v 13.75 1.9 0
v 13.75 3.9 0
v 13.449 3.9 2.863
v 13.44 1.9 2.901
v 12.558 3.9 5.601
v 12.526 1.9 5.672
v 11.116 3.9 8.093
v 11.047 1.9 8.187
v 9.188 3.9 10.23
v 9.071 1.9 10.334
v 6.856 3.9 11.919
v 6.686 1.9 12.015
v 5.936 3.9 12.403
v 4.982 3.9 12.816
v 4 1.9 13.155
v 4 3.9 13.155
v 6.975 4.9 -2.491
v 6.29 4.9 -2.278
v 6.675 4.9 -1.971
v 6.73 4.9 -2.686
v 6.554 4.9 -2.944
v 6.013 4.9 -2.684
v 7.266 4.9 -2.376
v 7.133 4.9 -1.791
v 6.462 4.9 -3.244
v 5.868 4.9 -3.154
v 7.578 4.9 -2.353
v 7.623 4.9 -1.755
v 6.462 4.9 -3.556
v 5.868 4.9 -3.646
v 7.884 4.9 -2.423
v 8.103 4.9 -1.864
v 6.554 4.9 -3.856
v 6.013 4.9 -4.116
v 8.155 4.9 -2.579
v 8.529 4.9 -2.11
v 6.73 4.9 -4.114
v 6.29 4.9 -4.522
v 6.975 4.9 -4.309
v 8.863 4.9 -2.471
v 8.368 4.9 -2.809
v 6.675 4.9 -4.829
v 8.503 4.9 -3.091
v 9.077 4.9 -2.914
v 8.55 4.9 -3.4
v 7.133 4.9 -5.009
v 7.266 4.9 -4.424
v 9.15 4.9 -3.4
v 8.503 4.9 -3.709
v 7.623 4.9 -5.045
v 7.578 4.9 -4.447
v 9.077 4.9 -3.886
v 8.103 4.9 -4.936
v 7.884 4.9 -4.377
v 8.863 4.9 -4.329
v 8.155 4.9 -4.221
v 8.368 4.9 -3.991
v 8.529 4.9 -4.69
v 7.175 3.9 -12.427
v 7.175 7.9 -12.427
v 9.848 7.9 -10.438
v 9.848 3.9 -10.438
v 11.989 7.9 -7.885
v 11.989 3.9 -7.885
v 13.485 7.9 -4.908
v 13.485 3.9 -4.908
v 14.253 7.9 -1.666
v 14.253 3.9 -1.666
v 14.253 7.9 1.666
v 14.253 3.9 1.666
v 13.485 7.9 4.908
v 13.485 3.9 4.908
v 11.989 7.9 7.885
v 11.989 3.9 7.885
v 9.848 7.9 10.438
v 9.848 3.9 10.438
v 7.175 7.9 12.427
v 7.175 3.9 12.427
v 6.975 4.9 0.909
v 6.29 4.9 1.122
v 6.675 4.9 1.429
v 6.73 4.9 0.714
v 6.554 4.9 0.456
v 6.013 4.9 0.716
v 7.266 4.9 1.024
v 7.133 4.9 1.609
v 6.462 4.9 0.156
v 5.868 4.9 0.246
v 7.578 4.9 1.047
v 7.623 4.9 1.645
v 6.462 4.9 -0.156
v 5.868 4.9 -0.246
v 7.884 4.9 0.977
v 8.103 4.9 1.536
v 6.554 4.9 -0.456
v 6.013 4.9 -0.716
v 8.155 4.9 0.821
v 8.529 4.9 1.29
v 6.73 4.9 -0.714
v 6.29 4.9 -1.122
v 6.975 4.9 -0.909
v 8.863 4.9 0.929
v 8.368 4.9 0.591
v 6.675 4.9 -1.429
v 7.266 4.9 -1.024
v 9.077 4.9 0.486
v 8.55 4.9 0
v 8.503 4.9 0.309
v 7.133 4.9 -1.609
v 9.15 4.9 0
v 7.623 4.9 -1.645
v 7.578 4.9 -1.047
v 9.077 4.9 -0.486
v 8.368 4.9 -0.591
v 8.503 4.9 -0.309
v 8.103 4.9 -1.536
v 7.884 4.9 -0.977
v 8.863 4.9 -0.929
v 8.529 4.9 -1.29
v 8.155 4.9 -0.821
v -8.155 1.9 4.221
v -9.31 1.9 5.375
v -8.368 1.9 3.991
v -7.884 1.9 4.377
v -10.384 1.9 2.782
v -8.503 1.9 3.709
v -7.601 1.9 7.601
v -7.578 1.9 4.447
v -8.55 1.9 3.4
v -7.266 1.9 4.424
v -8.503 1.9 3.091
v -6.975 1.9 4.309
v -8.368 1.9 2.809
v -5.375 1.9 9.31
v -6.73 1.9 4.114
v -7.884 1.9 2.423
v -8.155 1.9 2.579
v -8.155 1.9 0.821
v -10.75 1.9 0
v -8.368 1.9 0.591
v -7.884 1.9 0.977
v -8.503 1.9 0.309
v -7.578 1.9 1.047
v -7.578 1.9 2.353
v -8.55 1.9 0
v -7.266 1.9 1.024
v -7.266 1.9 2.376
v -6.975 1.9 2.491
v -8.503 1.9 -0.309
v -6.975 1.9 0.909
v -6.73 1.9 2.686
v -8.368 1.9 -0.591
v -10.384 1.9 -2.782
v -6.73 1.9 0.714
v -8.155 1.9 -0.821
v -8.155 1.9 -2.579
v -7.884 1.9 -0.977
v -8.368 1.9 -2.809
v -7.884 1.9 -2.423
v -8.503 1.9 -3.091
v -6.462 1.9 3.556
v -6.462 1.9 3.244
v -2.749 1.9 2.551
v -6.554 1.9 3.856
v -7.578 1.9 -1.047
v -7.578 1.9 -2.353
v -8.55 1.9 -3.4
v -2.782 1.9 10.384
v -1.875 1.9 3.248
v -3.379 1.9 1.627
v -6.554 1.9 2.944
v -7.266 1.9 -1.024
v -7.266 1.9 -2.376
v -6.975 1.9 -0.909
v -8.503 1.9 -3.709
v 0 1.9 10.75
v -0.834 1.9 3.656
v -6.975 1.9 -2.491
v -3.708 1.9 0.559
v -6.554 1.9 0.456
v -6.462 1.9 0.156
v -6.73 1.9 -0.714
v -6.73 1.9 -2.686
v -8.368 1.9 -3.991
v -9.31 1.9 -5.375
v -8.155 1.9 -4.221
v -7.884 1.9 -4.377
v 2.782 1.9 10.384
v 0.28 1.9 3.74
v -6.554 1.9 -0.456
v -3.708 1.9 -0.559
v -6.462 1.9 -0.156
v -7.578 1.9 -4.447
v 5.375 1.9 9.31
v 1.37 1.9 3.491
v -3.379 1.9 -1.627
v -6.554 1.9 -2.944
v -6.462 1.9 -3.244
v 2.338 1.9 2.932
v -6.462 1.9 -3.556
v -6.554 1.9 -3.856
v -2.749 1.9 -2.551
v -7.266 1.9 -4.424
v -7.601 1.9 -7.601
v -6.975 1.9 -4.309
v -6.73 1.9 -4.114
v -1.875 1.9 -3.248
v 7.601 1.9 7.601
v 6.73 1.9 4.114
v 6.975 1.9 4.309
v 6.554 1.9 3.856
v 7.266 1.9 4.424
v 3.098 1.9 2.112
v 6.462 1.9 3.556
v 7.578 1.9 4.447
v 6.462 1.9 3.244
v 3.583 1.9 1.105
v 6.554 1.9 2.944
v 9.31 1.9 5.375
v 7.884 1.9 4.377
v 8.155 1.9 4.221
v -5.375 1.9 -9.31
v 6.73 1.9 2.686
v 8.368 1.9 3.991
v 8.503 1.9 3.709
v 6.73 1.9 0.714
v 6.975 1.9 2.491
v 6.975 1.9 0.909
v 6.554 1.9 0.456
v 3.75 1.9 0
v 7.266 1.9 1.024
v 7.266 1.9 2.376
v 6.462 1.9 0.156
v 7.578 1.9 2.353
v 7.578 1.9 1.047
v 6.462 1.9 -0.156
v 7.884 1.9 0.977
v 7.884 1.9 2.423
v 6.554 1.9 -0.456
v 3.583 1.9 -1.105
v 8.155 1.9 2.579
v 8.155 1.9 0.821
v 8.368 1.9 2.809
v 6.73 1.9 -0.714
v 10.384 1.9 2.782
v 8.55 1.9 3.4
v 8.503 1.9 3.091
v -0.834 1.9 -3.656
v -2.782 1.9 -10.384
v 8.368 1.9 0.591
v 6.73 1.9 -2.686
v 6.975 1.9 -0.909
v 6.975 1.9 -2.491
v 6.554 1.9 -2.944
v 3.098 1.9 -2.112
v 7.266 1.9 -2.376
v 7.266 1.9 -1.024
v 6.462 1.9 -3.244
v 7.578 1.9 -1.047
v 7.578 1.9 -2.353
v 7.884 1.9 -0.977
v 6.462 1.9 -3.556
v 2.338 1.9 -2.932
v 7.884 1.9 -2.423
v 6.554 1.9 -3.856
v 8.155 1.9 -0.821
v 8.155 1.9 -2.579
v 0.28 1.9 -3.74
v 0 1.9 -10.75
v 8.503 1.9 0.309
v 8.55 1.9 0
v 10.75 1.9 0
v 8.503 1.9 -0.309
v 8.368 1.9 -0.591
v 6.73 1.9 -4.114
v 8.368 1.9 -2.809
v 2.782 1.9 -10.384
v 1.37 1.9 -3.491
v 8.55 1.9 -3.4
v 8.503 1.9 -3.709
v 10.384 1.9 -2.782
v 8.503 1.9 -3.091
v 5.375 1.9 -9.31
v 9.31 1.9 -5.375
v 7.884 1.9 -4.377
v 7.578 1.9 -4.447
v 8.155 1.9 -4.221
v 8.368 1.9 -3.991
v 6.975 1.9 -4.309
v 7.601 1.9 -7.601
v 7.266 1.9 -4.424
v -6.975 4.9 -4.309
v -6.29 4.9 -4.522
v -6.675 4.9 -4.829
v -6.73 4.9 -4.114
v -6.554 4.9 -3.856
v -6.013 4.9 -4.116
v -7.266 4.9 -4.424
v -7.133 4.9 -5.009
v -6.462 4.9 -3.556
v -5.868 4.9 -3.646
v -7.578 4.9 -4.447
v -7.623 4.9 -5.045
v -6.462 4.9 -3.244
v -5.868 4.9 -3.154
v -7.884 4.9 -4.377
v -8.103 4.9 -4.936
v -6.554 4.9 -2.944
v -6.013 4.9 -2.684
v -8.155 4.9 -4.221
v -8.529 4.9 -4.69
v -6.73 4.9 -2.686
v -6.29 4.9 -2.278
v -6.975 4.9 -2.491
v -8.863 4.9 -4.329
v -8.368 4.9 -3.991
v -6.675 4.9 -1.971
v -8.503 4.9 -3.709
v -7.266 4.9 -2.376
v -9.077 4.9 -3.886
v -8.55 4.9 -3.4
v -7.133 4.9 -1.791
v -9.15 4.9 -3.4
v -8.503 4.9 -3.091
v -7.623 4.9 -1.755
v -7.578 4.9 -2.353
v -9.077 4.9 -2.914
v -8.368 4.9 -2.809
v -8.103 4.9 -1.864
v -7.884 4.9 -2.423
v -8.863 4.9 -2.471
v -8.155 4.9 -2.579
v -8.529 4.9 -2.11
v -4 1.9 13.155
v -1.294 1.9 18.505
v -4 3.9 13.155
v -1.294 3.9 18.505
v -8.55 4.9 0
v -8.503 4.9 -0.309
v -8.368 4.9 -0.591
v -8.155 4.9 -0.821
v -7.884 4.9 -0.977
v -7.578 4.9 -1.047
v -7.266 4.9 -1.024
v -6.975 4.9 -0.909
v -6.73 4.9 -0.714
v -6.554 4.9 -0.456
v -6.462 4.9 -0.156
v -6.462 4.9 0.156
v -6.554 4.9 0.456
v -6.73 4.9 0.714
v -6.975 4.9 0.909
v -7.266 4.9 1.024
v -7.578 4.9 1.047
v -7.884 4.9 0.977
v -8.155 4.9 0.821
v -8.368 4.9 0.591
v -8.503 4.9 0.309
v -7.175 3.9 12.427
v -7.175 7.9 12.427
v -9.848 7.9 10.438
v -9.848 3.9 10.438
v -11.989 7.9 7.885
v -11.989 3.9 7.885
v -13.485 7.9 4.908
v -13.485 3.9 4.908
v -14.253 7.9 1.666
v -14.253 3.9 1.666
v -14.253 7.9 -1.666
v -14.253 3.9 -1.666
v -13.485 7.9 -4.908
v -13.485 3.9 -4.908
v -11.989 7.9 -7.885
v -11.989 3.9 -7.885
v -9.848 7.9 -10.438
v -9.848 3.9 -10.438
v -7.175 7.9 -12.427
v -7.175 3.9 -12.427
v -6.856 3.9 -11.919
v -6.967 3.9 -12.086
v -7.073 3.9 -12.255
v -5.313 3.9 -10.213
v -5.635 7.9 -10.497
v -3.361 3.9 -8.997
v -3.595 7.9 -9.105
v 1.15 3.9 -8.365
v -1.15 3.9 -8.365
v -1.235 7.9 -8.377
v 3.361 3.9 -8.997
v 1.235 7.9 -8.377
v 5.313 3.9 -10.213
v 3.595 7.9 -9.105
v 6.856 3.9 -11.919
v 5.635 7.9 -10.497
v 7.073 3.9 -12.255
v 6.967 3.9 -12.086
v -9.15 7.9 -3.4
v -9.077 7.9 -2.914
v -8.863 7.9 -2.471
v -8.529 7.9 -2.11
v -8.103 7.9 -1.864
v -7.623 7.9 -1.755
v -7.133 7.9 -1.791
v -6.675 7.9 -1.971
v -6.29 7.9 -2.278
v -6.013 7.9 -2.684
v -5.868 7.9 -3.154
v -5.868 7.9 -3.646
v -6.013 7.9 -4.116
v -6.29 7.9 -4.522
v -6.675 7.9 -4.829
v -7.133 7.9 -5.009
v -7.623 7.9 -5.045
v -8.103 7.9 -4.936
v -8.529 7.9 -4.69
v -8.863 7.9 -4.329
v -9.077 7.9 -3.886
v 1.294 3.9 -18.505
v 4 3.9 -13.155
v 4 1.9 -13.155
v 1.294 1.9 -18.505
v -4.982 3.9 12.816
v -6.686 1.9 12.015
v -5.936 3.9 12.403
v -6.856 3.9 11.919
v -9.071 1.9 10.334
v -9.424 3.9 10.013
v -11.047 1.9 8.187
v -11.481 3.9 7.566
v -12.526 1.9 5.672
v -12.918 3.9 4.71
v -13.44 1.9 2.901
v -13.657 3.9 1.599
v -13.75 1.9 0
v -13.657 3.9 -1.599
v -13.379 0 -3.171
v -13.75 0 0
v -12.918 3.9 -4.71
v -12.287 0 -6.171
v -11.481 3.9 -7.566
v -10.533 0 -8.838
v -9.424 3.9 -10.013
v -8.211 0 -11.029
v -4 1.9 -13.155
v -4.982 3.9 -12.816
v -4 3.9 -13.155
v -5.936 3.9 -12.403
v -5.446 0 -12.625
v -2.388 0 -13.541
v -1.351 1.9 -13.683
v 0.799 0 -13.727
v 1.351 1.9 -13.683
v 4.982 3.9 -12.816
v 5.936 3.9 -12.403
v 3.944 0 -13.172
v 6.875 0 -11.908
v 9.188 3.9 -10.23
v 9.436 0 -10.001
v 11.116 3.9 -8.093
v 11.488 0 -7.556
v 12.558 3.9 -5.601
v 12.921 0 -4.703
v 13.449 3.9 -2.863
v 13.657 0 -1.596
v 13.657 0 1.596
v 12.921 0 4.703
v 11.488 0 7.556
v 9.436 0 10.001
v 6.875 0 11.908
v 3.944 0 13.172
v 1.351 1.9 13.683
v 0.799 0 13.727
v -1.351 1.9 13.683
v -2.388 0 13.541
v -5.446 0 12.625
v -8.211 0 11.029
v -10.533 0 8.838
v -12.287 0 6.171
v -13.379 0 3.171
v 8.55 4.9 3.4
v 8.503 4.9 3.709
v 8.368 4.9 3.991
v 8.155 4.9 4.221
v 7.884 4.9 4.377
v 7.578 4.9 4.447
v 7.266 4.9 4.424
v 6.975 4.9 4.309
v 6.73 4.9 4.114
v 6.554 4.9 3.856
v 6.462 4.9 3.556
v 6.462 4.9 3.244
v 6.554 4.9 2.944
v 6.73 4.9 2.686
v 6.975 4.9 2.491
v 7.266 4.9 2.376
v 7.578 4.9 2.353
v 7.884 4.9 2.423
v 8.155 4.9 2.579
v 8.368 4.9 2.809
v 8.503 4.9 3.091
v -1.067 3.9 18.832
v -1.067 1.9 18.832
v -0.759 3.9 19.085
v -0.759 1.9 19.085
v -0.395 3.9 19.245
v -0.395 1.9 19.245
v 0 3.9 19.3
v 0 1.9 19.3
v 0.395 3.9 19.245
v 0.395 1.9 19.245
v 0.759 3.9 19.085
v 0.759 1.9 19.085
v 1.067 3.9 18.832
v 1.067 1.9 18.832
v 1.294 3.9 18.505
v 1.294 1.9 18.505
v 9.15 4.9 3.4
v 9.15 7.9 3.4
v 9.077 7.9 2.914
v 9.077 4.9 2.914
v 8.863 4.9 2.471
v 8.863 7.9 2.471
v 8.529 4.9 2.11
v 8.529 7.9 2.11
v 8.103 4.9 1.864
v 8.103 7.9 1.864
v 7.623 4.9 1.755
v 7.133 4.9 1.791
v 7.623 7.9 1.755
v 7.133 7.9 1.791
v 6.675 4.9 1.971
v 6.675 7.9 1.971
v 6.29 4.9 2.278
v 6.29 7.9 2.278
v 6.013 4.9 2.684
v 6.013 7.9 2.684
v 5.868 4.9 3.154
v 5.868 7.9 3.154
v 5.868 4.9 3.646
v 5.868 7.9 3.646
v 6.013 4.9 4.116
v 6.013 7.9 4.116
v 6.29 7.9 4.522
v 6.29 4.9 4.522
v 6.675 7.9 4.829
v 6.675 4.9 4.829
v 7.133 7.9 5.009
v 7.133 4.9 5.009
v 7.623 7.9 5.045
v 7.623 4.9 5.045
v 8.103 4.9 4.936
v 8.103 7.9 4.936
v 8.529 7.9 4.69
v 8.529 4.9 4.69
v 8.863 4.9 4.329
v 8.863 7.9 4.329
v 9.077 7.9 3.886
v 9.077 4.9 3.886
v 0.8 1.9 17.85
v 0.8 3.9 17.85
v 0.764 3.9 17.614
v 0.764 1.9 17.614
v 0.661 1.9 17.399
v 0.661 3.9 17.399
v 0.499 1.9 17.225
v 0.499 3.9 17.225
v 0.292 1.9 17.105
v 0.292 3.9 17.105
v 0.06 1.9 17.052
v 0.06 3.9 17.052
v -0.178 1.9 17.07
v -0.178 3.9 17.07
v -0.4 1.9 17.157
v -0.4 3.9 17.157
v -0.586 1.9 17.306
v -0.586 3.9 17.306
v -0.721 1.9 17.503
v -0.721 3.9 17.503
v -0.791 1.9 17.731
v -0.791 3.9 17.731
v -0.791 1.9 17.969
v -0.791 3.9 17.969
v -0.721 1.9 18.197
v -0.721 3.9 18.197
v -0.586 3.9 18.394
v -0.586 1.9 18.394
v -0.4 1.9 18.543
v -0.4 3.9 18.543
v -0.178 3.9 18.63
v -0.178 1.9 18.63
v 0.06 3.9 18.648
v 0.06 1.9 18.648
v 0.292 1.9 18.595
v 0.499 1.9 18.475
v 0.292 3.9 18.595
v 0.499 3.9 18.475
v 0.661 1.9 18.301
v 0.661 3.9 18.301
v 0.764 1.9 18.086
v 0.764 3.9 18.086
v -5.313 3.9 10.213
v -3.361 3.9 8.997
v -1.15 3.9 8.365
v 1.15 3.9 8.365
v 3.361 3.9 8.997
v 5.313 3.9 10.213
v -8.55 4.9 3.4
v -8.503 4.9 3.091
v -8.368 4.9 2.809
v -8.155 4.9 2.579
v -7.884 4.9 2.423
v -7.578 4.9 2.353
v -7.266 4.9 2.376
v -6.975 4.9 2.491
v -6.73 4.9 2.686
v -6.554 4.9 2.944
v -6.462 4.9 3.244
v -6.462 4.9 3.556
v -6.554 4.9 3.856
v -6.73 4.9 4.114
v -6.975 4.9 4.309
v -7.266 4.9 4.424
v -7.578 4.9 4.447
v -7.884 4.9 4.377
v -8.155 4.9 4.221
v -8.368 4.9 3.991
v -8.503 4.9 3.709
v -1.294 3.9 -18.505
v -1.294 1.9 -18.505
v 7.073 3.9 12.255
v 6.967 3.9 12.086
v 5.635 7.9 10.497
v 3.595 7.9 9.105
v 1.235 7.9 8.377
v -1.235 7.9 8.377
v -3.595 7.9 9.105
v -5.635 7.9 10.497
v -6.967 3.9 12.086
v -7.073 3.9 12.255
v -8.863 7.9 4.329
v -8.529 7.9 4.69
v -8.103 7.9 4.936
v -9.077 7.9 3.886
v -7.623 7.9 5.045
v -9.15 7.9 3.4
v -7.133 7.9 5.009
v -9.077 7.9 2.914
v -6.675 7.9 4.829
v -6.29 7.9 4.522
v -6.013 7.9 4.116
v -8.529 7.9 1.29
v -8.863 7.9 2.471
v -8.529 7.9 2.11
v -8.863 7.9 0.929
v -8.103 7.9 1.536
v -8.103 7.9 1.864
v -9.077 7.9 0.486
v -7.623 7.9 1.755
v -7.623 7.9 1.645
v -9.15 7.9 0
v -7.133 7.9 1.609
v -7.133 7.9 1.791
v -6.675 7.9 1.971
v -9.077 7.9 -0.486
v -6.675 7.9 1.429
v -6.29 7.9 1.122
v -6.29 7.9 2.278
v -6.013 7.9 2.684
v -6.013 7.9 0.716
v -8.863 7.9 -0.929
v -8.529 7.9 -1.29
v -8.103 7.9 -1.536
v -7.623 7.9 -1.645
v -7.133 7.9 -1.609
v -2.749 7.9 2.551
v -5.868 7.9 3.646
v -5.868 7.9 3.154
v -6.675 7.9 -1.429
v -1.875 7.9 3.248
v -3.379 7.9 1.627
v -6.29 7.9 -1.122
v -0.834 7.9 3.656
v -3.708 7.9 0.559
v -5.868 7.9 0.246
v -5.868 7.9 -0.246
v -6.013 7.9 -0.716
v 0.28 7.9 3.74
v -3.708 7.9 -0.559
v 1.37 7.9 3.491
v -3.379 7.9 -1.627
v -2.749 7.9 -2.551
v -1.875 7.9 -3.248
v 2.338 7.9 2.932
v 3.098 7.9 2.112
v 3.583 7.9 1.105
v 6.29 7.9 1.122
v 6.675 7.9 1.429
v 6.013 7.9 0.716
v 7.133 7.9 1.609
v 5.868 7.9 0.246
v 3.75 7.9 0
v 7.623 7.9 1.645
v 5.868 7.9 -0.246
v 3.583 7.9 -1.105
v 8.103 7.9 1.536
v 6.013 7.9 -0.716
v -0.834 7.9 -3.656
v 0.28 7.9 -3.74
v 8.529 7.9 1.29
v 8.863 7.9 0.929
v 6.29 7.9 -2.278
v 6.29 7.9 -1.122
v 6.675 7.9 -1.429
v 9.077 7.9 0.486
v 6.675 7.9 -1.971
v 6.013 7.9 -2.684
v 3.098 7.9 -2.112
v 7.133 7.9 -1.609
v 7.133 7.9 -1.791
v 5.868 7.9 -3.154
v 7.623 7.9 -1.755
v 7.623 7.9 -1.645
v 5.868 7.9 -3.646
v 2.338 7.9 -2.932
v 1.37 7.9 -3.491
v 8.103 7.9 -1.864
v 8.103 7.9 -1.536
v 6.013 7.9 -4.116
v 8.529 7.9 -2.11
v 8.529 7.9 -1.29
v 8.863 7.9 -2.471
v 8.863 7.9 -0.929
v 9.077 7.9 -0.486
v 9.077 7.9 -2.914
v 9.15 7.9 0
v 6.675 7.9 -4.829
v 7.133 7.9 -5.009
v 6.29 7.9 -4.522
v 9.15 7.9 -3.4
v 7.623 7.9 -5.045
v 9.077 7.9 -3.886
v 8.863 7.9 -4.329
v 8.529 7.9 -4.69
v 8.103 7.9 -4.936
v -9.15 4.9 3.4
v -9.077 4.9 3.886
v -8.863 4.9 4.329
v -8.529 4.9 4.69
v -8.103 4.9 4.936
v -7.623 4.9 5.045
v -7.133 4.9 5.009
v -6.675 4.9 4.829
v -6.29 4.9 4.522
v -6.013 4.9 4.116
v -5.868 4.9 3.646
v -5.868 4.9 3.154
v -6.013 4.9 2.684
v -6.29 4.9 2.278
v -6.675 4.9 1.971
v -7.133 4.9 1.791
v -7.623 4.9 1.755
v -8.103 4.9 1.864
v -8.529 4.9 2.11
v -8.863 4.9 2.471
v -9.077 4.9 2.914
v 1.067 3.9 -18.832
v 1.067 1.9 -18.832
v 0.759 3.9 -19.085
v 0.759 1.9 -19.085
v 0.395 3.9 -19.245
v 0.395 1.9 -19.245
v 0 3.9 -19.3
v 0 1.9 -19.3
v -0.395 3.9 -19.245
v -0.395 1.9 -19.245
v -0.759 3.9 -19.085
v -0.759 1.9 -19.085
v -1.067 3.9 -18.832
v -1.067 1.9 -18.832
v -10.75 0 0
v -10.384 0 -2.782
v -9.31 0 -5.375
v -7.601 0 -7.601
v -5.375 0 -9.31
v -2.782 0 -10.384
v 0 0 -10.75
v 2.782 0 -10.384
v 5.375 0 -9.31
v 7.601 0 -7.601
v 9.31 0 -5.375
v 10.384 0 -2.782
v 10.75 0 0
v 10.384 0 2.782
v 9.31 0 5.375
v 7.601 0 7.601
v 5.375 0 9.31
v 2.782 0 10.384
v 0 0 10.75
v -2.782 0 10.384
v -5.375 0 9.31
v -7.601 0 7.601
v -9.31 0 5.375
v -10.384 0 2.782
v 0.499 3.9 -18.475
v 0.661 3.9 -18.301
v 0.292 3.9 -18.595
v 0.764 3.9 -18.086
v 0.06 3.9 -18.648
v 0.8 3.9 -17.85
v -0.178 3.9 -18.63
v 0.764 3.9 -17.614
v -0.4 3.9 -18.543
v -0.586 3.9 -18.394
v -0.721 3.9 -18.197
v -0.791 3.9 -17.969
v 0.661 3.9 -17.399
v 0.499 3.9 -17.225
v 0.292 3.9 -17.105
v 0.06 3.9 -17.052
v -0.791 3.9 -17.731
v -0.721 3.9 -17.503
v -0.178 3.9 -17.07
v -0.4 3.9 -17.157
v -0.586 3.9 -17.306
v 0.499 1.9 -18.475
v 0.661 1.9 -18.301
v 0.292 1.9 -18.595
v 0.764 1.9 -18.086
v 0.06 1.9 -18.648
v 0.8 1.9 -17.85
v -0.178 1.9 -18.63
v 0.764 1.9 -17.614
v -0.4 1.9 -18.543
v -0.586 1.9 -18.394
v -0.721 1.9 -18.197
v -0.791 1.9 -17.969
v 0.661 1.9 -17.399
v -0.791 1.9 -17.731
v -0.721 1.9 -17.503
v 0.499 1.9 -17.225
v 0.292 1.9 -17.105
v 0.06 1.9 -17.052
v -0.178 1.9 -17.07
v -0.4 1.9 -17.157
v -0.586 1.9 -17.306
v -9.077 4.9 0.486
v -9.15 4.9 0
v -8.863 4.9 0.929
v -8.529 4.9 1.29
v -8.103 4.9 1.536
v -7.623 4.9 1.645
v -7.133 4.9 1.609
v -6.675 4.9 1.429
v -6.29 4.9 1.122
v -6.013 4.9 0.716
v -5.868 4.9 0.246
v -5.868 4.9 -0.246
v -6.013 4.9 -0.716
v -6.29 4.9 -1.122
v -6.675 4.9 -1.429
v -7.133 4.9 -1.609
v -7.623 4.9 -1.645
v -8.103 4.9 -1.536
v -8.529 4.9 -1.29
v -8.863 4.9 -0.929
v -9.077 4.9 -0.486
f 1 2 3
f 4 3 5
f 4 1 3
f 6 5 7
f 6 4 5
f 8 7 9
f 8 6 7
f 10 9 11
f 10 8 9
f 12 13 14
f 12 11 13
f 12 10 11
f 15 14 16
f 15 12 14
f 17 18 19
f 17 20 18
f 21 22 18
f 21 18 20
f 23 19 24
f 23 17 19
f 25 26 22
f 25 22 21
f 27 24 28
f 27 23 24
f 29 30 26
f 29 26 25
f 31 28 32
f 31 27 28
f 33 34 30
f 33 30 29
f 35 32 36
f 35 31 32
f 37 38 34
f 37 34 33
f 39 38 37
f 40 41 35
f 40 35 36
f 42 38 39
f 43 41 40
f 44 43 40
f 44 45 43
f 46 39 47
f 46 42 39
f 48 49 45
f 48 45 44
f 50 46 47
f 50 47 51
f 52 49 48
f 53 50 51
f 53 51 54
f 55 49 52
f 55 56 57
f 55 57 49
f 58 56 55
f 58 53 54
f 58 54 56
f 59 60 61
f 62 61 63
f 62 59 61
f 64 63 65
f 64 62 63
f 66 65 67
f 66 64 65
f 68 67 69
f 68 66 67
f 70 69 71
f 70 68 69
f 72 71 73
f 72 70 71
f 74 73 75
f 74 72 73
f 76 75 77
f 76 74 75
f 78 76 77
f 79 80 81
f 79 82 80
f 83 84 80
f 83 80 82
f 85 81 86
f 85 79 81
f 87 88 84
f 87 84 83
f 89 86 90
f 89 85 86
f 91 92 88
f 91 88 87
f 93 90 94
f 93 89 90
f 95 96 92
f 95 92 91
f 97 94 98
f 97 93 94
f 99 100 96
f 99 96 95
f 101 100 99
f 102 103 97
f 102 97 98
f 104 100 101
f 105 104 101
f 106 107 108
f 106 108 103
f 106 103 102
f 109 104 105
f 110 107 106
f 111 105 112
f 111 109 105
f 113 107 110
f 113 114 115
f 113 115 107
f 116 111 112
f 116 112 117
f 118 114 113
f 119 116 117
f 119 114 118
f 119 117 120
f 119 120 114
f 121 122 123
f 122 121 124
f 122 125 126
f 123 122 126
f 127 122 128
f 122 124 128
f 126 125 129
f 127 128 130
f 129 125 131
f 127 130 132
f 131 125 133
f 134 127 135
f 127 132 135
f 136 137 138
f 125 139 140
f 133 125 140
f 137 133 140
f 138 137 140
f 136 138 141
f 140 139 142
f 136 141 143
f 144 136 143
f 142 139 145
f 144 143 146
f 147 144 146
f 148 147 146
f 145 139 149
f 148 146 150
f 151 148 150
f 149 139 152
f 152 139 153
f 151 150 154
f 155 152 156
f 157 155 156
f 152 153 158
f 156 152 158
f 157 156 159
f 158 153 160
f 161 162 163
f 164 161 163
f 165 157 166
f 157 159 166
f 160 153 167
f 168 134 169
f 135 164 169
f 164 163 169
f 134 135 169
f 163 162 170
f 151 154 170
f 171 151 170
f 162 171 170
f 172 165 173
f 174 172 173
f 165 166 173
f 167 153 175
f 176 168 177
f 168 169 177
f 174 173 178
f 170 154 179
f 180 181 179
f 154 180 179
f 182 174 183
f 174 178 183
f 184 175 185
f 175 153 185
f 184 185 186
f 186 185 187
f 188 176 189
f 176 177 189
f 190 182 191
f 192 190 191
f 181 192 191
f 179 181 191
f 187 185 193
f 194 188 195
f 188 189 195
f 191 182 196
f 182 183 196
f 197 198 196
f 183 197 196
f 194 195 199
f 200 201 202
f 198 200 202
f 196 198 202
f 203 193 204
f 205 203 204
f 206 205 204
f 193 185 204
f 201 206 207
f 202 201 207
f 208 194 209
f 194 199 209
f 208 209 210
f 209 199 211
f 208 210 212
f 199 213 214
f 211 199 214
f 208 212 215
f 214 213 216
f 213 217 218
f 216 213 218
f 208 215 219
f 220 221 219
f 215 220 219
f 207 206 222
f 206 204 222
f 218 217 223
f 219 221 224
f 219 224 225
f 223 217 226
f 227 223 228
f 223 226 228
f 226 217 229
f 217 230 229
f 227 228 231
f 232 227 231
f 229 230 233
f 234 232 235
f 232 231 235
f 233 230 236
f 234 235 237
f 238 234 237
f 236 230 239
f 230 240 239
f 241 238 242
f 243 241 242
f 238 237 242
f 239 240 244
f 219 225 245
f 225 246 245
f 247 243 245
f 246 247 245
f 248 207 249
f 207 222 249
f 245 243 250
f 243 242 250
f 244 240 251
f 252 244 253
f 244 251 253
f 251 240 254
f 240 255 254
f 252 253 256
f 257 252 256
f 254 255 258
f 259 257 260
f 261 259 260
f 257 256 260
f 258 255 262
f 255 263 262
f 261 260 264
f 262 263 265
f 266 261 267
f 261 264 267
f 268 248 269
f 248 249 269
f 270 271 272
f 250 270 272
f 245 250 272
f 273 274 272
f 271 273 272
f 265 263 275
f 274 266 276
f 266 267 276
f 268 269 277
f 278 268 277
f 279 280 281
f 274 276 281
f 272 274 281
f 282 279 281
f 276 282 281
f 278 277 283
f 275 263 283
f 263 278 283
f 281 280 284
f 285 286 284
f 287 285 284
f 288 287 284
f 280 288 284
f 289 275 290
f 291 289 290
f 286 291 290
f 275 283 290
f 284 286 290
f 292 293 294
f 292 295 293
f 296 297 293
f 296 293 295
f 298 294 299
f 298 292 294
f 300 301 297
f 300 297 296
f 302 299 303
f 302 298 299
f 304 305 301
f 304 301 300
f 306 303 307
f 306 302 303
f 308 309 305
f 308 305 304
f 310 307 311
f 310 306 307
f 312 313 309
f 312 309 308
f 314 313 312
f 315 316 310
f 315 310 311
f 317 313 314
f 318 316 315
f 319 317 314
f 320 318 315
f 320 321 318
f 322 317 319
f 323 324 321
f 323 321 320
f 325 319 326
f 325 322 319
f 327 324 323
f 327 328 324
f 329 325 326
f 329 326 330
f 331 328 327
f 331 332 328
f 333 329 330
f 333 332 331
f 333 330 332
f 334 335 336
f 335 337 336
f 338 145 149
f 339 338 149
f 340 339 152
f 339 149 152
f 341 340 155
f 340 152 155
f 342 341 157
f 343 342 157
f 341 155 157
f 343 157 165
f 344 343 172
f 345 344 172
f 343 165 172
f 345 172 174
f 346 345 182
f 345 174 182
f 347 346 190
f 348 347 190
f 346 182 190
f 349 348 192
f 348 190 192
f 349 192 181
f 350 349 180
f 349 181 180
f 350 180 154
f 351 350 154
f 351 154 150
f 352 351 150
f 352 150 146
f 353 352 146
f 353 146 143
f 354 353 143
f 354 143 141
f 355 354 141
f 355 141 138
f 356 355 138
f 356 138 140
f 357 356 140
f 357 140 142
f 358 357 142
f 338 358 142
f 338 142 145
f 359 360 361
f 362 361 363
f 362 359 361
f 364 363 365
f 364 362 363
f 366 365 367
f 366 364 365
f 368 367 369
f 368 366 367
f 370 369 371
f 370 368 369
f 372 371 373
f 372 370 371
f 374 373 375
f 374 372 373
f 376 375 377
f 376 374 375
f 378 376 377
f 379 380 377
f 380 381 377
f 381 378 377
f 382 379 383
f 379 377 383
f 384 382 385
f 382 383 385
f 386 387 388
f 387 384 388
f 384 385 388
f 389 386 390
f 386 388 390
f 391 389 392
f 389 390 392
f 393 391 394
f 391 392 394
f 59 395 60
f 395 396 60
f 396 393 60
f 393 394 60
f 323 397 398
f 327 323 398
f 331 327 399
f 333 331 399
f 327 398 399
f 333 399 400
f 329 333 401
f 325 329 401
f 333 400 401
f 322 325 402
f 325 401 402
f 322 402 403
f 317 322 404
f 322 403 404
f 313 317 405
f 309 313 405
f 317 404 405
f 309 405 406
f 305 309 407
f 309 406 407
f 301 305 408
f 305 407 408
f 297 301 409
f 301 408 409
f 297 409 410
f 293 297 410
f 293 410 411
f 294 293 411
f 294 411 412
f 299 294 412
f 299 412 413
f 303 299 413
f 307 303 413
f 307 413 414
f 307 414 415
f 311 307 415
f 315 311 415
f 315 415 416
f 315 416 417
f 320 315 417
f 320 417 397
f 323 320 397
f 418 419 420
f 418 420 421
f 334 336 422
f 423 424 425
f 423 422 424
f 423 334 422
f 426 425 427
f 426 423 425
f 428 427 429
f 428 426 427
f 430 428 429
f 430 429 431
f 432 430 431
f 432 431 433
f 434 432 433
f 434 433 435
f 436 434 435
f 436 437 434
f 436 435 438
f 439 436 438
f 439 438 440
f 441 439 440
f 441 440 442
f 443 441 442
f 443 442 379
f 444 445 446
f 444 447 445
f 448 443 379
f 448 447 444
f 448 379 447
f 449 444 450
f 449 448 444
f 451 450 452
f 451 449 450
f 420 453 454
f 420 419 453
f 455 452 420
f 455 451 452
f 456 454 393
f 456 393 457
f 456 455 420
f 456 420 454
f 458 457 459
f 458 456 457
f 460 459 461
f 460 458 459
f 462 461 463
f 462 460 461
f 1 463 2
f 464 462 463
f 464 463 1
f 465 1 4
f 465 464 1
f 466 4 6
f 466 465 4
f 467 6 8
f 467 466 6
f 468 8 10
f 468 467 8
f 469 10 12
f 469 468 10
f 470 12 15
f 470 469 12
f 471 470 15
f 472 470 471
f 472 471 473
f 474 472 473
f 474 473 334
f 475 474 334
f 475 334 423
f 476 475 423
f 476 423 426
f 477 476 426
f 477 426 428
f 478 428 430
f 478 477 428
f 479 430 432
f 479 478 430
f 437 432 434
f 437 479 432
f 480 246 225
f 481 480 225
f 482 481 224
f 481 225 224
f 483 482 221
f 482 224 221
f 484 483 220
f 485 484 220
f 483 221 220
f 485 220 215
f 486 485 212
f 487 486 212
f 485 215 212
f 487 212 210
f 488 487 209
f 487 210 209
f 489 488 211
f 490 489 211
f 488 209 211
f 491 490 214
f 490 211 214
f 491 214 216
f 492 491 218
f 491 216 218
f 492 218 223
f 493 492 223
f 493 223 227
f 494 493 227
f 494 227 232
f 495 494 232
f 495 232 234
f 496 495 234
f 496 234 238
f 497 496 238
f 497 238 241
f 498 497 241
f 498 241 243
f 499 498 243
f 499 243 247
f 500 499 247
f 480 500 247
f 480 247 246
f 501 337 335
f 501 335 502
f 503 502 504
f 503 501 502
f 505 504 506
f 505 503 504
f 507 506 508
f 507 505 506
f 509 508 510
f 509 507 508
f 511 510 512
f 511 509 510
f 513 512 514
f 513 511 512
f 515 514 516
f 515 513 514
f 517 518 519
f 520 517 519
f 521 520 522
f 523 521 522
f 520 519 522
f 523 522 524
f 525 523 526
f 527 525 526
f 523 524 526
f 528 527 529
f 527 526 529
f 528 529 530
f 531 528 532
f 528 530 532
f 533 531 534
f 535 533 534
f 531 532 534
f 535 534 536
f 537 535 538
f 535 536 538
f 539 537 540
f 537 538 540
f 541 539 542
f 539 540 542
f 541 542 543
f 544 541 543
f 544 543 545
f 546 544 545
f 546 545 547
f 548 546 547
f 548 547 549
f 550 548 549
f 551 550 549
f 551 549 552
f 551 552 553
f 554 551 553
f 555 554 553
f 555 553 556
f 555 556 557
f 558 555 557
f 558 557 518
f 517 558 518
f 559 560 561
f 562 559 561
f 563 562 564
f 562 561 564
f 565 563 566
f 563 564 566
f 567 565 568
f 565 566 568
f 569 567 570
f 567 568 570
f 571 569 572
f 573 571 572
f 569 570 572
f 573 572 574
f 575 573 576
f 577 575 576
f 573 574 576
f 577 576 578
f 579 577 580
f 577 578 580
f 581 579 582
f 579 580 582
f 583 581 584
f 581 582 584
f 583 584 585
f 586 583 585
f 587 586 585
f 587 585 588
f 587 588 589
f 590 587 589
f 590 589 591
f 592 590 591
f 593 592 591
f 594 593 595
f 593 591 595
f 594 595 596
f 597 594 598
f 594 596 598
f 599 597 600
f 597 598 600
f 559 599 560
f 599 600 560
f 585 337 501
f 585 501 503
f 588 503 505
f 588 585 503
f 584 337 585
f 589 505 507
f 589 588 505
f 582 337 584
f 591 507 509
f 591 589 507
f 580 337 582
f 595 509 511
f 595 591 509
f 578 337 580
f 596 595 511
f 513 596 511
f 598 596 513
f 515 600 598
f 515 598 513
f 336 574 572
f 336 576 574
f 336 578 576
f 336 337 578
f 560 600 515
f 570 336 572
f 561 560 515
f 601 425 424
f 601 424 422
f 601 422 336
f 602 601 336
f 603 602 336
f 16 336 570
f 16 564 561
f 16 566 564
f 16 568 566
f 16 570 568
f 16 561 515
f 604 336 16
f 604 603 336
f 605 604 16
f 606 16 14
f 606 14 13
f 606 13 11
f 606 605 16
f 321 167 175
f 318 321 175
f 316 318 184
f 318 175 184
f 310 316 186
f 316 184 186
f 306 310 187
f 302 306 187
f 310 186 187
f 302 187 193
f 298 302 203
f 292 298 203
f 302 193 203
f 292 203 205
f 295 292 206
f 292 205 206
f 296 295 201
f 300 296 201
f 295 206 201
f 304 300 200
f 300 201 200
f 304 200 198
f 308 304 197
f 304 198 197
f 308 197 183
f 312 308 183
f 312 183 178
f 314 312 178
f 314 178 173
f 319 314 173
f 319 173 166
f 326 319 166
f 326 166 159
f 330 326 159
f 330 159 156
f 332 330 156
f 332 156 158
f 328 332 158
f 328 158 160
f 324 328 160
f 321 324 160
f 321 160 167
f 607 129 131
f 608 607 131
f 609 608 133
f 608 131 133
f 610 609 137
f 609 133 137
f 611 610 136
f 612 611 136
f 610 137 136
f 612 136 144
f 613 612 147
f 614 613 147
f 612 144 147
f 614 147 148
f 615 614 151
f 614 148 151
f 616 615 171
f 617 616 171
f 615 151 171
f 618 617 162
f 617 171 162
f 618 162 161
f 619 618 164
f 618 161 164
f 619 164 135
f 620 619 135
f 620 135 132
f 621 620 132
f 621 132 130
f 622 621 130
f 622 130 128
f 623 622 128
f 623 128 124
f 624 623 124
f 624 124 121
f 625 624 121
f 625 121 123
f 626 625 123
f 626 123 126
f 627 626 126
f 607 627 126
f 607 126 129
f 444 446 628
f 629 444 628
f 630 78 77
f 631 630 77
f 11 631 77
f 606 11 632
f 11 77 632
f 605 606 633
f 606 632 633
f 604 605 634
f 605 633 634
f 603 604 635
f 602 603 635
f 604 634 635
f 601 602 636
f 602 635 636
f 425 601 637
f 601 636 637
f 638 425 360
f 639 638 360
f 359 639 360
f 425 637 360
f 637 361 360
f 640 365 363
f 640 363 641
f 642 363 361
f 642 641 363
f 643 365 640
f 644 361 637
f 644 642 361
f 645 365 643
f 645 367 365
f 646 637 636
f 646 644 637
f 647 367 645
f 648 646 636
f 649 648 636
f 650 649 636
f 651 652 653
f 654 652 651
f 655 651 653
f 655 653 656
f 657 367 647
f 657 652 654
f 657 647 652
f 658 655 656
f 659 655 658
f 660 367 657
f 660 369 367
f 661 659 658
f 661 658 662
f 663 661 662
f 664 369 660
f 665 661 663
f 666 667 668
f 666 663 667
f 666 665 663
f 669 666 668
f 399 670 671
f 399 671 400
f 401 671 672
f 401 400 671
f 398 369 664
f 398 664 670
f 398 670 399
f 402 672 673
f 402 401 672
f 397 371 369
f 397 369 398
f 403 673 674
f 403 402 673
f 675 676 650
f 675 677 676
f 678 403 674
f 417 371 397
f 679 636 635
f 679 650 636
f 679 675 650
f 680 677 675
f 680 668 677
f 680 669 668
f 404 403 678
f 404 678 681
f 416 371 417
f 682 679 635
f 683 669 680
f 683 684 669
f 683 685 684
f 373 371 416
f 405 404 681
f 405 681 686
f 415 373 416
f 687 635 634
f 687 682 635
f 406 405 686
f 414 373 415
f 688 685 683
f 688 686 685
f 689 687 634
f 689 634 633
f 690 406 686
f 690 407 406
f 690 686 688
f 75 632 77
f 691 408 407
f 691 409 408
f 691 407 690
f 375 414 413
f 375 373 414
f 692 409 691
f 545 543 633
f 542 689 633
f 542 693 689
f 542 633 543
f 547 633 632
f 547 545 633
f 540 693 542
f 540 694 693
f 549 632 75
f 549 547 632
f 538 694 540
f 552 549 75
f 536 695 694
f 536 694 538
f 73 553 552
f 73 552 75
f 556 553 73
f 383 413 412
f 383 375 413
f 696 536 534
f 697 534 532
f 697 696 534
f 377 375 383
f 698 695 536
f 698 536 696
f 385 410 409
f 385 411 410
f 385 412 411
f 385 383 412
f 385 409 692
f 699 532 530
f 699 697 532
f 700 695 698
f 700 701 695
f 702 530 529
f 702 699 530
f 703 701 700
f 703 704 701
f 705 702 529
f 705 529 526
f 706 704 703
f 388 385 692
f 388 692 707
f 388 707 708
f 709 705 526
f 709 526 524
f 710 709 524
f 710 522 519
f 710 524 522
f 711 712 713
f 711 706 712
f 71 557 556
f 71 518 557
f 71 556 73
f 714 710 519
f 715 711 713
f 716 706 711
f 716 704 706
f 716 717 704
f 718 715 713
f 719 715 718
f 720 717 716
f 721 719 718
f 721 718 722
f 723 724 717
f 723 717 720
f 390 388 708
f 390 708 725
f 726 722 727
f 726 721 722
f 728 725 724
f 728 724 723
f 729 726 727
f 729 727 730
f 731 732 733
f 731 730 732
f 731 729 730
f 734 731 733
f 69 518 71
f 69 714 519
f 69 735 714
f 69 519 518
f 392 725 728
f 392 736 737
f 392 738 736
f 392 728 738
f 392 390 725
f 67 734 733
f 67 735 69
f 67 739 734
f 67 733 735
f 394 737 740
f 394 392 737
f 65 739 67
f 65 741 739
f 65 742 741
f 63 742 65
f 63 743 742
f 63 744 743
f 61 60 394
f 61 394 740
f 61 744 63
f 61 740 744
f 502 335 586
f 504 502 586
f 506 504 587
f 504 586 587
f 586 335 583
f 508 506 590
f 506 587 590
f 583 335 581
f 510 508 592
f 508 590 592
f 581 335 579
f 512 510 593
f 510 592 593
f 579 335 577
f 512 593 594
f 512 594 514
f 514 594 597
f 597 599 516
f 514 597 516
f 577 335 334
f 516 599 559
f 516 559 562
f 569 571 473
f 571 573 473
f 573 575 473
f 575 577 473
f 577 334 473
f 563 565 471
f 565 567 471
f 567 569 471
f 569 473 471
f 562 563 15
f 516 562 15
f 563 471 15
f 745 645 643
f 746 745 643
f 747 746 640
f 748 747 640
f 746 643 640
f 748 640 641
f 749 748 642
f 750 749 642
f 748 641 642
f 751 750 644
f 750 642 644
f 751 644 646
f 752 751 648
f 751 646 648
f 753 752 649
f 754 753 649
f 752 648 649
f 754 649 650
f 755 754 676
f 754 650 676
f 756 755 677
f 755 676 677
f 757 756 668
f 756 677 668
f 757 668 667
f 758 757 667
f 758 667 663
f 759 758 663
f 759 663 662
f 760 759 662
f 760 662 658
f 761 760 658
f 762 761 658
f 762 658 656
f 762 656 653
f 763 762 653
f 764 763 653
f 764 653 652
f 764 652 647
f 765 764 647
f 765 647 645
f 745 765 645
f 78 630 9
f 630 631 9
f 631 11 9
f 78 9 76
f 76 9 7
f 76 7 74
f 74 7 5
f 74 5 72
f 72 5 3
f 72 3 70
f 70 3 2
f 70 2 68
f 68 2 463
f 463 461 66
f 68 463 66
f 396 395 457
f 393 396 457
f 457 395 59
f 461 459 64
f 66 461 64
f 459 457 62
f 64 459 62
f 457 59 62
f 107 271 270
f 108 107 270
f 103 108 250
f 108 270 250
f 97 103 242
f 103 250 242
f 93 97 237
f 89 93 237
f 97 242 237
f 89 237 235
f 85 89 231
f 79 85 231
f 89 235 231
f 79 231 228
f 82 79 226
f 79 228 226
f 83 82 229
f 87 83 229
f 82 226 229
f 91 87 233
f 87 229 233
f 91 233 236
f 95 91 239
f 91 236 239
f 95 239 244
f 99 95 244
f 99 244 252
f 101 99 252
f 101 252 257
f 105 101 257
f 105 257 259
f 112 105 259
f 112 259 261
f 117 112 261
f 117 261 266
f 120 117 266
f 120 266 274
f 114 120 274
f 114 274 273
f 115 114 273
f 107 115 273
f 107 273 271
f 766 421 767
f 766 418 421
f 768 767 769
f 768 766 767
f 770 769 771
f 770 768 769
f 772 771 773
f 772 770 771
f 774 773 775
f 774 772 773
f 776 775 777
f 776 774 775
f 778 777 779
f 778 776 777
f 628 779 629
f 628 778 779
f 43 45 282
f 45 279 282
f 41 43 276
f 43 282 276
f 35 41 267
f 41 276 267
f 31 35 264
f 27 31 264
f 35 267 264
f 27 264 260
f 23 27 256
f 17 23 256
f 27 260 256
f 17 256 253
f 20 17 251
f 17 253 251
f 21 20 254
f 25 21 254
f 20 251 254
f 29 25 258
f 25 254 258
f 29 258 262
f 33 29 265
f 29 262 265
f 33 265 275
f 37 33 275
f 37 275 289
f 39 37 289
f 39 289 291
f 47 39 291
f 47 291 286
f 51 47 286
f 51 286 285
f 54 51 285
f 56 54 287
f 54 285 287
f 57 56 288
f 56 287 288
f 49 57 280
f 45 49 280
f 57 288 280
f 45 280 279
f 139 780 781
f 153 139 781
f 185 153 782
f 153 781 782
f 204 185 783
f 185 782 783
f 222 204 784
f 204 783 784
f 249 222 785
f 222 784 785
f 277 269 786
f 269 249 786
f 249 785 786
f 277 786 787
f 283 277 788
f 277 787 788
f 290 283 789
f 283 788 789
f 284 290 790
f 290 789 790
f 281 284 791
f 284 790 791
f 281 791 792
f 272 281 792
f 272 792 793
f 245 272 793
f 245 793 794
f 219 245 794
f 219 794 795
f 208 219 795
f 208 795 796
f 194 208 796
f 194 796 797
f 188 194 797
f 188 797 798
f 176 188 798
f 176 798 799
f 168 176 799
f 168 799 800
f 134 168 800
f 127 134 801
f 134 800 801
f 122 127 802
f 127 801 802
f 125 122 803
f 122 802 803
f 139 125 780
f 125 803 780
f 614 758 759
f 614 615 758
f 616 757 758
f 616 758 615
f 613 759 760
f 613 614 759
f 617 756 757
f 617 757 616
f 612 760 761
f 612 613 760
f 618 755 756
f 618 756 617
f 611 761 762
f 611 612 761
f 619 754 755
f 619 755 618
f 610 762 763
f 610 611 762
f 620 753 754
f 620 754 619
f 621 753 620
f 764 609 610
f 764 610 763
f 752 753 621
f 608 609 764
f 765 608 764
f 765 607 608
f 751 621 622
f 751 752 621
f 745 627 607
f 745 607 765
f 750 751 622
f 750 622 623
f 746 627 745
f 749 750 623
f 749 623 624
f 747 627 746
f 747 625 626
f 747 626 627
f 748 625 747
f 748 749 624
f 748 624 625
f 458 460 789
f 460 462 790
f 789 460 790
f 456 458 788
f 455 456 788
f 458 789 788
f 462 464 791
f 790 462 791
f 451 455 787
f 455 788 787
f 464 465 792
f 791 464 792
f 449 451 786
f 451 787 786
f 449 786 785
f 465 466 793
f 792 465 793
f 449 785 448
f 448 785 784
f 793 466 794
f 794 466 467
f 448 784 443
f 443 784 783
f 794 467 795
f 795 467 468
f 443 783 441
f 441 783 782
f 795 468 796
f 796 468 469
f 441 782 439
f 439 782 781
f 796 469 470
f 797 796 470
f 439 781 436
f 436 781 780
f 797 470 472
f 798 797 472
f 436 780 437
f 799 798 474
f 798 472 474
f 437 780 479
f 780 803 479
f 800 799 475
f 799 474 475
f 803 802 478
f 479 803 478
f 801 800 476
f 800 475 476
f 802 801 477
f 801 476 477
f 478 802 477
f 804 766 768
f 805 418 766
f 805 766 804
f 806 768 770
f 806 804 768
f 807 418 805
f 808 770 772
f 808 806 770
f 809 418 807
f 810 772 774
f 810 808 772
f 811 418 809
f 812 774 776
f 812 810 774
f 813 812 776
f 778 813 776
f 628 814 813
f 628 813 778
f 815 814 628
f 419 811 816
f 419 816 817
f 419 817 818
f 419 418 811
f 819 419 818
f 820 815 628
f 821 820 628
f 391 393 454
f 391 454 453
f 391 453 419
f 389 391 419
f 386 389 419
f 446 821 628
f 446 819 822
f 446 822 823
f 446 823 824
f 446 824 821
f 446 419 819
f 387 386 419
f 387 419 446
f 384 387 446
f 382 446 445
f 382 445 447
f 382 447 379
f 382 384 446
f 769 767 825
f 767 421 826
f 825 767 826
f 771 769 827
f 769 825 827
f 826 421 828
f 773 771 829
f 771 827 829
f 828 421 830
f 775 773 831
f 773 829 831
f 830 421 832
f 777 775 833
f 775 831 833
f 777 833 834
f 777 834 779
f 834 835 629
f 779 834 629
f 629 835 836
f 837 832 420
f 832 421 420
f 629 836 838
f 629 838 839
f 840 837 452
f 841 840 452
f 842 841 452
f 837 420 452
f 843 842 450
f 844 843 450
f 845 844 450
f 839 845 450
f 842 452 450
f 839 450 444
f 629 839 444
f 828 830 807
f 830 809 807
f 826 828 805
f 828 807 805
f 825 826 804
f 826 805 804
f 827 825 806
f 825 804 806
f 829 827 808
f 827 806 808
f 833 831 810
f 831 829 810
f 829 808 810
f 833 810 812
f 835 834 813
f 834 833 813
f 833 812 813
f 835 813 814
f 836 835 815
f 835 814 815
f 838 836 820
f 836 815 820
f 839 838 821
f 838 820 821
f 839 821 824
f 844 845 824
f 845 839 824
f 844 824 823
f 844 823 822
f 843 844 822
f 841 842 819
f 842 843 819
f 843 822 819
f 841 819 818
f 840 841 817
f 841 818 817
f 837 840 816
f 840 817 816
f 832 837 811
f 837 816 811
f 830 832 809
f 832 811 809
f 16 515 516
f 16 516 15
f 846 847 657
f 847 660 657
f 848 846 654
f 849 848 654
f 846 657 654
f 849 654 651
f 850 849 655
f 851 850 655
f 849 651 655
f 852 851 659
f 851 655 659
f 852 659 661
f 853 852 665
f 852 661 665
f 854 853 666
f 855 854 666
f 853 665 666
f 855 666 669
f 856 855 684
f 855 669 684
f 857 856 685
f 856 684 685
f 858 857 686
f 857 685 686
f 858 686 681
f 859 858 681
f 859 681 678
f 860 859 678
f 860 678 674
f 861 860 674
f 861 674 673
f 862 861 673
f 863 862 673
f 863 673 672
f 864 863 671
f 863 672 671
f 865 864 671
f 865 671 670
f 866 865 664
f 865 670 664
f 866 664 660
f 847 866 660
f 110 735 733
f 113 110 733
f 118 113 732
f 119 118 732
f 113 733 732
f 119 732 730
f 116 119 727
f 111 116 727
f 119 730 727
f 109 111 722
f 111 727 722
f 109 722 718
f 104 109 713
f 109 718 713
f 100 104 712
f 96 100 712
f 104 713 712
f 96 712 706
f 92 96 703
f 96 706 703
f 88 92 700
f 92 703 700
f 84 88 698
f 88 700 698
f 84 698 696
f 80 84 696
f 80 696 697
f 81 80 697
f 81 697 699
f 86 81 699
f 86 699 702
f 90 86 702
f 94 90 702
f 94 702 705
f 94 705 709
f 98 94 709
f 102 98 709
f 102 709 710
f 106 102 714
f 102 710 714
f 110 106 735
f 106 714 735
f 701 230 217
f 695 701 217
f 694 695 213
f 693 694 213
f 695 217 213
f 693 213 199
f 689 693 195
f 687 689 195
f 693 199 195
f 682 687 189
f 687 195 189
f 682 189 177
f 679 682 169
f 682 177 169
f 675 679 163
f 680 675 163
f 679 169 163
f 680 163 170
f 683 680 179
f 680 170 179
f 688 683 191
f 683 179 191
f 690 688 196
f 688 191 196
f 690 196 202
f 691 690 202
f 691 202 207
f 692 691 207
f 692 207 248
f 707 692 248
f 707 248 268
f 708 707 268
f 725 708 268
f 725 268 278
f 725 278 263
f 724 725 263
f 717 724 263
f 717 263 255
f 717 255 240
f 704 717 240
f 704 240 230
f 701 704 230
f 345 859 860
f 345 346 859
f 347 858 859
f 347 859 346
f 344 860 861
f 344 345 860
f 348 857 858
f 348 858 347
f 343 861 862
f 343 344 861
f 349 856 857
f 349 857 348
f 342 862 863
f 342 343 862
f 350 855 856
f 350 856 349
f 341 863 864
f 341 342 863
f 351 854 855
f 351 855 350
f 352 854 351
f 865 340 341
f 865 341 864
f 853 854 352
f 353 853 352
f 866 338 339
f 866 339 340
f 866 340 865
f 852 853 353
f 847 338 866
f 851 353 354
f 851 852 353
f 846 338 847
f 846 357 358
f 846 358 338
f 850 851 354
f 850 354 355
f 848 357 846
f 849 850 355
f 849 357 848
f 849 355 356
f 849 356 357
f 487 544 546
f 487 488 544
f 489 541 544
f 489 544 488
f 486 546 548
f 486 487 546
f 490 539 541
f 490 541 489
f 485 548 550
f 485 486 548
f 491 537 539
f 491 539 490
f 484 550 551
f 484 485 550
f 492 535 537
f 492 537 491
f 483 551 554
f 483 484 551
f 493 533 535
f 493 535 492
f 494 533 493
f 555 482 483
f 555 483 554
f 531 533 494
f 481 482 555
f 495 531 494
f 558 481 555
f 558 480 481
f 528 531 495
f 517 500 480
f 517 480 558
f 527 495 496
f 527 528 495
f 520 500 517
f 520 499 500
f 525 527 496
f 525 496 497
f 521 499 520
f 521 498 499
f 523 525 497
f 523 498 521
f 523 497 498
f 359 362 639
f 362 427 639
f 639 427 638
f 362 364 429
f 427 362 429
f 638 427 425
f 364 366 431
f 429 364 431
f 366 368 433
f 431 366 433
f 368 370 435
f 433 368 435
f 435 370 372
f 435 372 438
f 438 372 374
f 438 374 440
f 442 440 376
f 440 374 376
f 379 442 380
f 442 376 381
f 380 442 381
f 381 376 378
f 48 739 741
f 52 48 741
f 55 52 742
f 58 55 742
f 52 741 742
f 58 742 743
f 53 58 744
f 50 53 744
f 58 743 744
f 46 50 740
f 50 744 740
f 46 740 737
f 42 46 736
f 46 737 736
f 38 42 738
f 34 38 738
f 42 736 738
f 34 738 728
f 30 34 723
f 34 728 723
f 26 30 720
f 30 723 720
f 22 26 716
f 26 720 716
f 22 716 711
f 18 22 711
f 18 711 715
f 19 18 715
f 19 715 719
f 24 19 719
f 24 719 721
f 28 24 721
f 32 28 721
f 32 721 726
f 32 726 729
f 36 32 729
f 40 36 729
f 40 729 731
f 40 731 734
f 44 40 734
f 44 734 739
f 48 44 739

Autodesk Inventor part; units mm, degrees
ref_plane "YZ Plane" through (0, 0, 0) normal (1, 0, 0) x (0, 1, 0)
ref_plane "XZ Plane" through (0, 0, 0) normal (0, 1, 0) x (-1, 0, 0)
ref_plane "XY Plane" through (0, 0, 0) normal (0, 0, 1) x (1, 0, 0)
sketch "Sketch1" plane through (0, 0, 0) normal (0, 1, 0) x (-1, 0, 0)
  circle A0 centre (0, 0) radius 10.75
  circle A1 centre (0, 0) radius 13.75
  dimension "d0" = 21.5
  dimension "d1" = 3
extrude "Extrusion1" add sketch "Sketch1" along normal blind 1.9
sketch "Sketch2" plane through (0, 1.9, 0) normal (0, 1, 0) x (1, 0, 0)
  circle A0 centre (0, 0) radius 13.75 projected
extrude "Extrusion2" add sketch "Sketch2" along normal blind 2
sketch "Sketch3" plane through (0, 3.9, 0) normal (0, 1, 0) x (1, 0, 0)
  circle A0 centre (0, 0) radius 1.75
  dimension "d6" = 3.5
extrude "Extrusion3" cut sketch "Sketch3" along normal through all both and the other way through all
sketch "Sketch4" plane through (0, 1.9, 0) normal (0, -1, 0) x (1, 0, 0)
  circle A0 centre (7.5, 0.0066) radius 0.95
  circle A1 centre (7.5, -3.3934) radius 0.95
  circle A2 centre (7.5, 3.4066) radius 0.95
  point P0 (0, 0)
  dimension "d9" = 1.9
  dimension "d10" = 1.9
  dimension "d11" = 1.9
  dimension "d12" = 7.5
  dimension "d13" = 7.5
  dimension "d14" = 7.5
  dimension "d15" = 3.4
  dimension "d16" = 3.4
extrude "Extrusion4" [suppressed]
pattern_circular "Circular Pattern1" [suppressed]
sketch "Sketch5" plane through (0, 3.9, 0) normal (0, 1, 0) x (1, 0, 0)
  circle A0 centre (0, -17.85) radius 0.8
  circle A1 centre (0, -17.85) radius 1.45
  circle A2 centre (0, 0) radius 13.75 projected
  line L0 (-1.2939, -18.5046) -> (-4, -13.1553)
  line L1 (1.2939, -18.5046) -> (4, -13.1553)
  dimension "d22" = 1.6
  dimension "d23" = 17.85
  dimension "d24" = 2.9
  dimension "d25" = 0
  dimension "d26" = 4
  dimension "d27" = 4
extrude "Extrusion5" add sketch "Sketch5" against normal blind 2 contours A1 | A1 L0 A2 L1
sketch "Sketch6" plane through (0, 3.9, 0) normal (0, 1, 0) x (1, 0, 0)
  circle A0 centre (0, 0) radius 14.35
  dimension "d30" = 28.7
extrude "Extrusion6" add sketch "Sketch6" along normal blind 4
sketch "Sketch7" plane through (0, 7.9, 0) normal (0, 1, 0) x (1, 0, 0)
  circle A0 centre (0, 0) radius 1.75 projected
  line L0 (0, 0) -> (0, -16.57)
  line L1 (0, -16.57) -> (7.1751, -12.4274)
  line L2 (7.1751, -12.4274) -> (0, 0)
  circle A1 centre (0, 0) radius 14.35 projected
  arc A2 (7.1751, -12.4274) -> (-7.1751, -12.4274) centre (0, -16.57) ccw
  arc A3 (-7.1751, -12.4274) -> (7.1751, -12.4274) centre (0, 0) ccw
  dimension "d33" = 16.57
extrude "Extrusion7" cut sketch "Sketch7" against normal blind 4 contours A2 A1 L0 | L0 A1 A2
sketch "Sketch8" plane through (0, 1.9, 0) normal (0, -1, 0) x (1, 0, 0)
  circle A0 centre (-3.4066, 7.5) radius 0.95 projected
  arc A1 (-7.1751, 12.4274) -> (-6.8562, 11.9187) centre (0, 16.57) ccw projected
  circle A2 centre (-0.0066, 7.5) radius 0.95 projected
  circle A3 centre (3.3934, 7.5) radius 0.95 projected
  circle A4 centre (7.5, 3.4066) radius 0.95 projected
  circle A5 centre (7.5, 0.0066) radius 0.95 projected
  circle A6 centre (7.5, -3.3934) radius 0.95 projected
  circle A7 centre (3.4066, -7.5) radius 0.95 projected
  circle A8 centre (0.0066, -7.5) radius 0.95 projected
  circle A9 centre (-3.3934, -7.5) radius 0.95 projected
  circle A10 centre (-7.5, -3.4066) radius 0.95 projected
  circle A11 centre (-7.5, -0.0066) radius 0.95 projected
  circle A12 centre (-7.5, 3.3934) radius 0.95 projected
  circle A13 centre (0, 0) radius 1.75 projected
  arc A14 (-7.1751, 12.4274) -> (7.1751, 12.4274) centre (0, 0) ccw projected
  arc A15 (6.8562, 11.9187) -> (7.1751, 12.4274) centre (0, 16.57) ccw projected
  arc A16 (-6.8562, 11.9187) -> (6.8562, 11.9187) centre (0, 0) ccw projected
  point P0 (0.5052, 8.3003)
  point P1 (-0.5172, 8.3011)
extrude "Extrusion8" [suppressed]
sketch "Sketch9" plane through (0, 1.9, 0) normal (0, -1, 0) x (1, 0, 0)
  circle A0 centre (0, 0) radius 3.75
  dimension "d38" = 7.5
extrude "Extrusion9" cut sketch "Sketch9" against normal through all
sketch "Sketch10" plane through (0, 1.9, 0) normal (0, -1, 0) x (1, 0, 0)
  circle A0 centre (7.5, 3.4) radius 1.05
  circle A1 centre (7.5, 0) radius 1.05
  circle A2 centre (7.5, -3.4) radius 1.05
  point P0 (0, 0)
  dimension "d41" = 2.1
  dimension "d42" = 2.1
  dimension "d43" = 2.1
  dimension "d44" = 0
  dimension "d45" = 7.5
  dimension "d46" = 7.5
  dimension "d47" = 7.5
  dimension "d48" = 3.4
  dimension "d49" = 3.4
extrude "Extrusion10" cut sketch "Sketch10" against normal through all
pattern_circular "Circular Pattern2" [suppressed]
pattern_circular "Circular Pattern4" count 2 over 360 about axis through (0, -10, 0) along (0, 1, 0) of "Extrusion10"
sketch "Sketch11" plane through (0, 7.9, 0) normal (0, 1, 0) x (1, 0, 0)
  circle A0 centre (7.5, -3.4) radius 1.05 projected
  circle A1 centre (7.5, 0) radius 1.05 projected
  circle A2 centre (7.5, 3.4) radius 1.05 projected
  circle A3 centre (7.5, -3.4) radius 1.65
  circle A4 centre (7.5, 0) radius 1.65
  circle A5 centre (7.5, 3.4) radius 1.65
  point P0 (0, 0)
  dimension "d61" = 3.3
  dimension "d62" = 3.3
  dimension "d63" = 3.3
extrude "Extrusion11" cut sketch "Sketch11" against normal blind 3 contours A0 | A1 | A2 | A3 | A4 | A5
pattern_circular "Circular Pattern5" count 2 over 360 about axis through (0, -10, 0) along (0, 1, 0) of "Extrusion11"
pattern_circular "Circular Pattern6" [suppressed]
mirror "Mirror1" about plane through (0, 0, 0) normal (0, 0, 1) of "Extrusion5"
mirror "Mirror2" about plane through (0, 0, 0) normal (0, 0, 1) of "Extrusion7"
equation "\"d13\" = d12"
equation "\"d14\" = d12"
equation "\"d16\" = d15"
equation "\"d27\" = d26"
equation "\"d46\" = d45"
equation "\"d47\" = d45"
equation "\"d49\" = d48"
properties part number "pin_r1"
